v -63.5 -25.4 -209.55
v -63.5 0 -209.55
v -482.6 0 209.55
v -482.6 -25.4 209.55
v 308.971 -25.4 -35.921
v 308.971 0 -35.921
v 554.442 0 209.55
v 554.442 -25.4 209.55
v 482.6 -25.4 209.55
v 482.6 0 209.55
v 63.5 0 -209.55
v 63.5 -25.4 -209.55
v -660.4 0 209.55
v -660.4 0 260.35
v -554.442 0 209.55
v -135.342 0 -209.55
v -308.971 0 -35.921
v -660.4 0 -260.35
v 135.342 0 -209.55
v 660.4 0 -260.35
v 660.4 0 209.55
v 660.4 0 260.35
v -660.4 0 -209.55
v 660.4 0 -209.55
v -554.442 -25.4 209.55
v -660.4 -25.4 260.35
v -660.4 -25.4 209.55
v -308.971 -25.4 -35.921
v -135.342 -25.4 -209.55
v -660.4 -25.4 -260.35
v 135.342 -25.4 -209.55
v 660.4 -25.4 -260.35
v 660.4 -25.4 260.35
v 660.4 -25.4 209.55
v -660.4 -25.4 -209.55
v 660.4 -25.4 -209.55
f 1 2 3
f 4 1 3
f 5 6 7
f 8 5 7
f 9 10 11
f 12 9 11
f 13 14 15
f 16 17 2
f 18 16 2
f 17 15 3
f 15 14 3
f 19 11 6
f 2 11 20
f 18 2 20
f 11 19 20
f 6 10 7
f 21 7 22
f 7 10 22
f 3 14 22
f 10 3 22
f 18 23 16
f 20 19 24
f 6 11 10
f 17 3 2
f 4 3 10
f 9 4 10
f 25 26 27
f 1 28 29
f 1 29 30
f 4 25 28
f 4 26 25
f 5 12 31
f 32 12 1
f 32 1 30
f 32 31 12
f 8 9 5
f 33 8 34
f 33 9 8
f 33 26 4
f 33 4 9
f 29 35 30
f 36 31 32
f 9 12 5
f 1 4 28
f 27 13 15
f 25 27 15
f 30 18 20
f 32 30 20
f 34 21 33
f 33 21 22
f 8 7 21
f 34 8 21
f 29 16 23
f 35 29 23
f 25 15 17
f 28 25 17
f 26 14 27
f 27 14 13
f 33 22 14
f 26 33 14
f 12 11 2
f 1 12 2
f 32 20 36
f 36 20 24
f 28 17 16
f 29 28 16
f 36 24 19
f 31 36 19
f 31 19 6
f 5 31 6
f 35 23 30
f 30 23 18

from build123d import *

# Parameters (mm, degrees)
F1_DEPTH = 25.4


with BuildPart() as f1:
    # F0 (on Front) → F1 (new body)
    with BuildSketch(Plane.XZ):
        Polygon((660.4, 209.55), (660.4, 260.35), (-660.4, 260.35), (-660.4, 209.55), (-554.442049, 209.55), (-482.6, 209.55), (-63.5, 209.55), (63.5, 209.55), (482.6, 209.55), (554.442049, 209.55), align=None)
        Polygon((308.971024, -35.921024), (554.442049, 209.55), (482.6, 209.55), (63.5, -209.55), (135.342049, -209.55), align=None)
        Polygon((135.342049, -209.55), (63.5, -209.55), (-63.5, -209.55), (-135.342049, -209.55), (-660.4, -209.55), (-660.4, -260.35), (660.4, -260.35), (660.4, -209.55), align=None)
        Polygon((-482.6, 209.55), (-554.442049, 209.55), (-308.971024, -35.921024), (-135.342049, -209.55), (-63.5, -209.55), align=None)
    extrude(amount=F1_DEPTH)


solid = f1.part
